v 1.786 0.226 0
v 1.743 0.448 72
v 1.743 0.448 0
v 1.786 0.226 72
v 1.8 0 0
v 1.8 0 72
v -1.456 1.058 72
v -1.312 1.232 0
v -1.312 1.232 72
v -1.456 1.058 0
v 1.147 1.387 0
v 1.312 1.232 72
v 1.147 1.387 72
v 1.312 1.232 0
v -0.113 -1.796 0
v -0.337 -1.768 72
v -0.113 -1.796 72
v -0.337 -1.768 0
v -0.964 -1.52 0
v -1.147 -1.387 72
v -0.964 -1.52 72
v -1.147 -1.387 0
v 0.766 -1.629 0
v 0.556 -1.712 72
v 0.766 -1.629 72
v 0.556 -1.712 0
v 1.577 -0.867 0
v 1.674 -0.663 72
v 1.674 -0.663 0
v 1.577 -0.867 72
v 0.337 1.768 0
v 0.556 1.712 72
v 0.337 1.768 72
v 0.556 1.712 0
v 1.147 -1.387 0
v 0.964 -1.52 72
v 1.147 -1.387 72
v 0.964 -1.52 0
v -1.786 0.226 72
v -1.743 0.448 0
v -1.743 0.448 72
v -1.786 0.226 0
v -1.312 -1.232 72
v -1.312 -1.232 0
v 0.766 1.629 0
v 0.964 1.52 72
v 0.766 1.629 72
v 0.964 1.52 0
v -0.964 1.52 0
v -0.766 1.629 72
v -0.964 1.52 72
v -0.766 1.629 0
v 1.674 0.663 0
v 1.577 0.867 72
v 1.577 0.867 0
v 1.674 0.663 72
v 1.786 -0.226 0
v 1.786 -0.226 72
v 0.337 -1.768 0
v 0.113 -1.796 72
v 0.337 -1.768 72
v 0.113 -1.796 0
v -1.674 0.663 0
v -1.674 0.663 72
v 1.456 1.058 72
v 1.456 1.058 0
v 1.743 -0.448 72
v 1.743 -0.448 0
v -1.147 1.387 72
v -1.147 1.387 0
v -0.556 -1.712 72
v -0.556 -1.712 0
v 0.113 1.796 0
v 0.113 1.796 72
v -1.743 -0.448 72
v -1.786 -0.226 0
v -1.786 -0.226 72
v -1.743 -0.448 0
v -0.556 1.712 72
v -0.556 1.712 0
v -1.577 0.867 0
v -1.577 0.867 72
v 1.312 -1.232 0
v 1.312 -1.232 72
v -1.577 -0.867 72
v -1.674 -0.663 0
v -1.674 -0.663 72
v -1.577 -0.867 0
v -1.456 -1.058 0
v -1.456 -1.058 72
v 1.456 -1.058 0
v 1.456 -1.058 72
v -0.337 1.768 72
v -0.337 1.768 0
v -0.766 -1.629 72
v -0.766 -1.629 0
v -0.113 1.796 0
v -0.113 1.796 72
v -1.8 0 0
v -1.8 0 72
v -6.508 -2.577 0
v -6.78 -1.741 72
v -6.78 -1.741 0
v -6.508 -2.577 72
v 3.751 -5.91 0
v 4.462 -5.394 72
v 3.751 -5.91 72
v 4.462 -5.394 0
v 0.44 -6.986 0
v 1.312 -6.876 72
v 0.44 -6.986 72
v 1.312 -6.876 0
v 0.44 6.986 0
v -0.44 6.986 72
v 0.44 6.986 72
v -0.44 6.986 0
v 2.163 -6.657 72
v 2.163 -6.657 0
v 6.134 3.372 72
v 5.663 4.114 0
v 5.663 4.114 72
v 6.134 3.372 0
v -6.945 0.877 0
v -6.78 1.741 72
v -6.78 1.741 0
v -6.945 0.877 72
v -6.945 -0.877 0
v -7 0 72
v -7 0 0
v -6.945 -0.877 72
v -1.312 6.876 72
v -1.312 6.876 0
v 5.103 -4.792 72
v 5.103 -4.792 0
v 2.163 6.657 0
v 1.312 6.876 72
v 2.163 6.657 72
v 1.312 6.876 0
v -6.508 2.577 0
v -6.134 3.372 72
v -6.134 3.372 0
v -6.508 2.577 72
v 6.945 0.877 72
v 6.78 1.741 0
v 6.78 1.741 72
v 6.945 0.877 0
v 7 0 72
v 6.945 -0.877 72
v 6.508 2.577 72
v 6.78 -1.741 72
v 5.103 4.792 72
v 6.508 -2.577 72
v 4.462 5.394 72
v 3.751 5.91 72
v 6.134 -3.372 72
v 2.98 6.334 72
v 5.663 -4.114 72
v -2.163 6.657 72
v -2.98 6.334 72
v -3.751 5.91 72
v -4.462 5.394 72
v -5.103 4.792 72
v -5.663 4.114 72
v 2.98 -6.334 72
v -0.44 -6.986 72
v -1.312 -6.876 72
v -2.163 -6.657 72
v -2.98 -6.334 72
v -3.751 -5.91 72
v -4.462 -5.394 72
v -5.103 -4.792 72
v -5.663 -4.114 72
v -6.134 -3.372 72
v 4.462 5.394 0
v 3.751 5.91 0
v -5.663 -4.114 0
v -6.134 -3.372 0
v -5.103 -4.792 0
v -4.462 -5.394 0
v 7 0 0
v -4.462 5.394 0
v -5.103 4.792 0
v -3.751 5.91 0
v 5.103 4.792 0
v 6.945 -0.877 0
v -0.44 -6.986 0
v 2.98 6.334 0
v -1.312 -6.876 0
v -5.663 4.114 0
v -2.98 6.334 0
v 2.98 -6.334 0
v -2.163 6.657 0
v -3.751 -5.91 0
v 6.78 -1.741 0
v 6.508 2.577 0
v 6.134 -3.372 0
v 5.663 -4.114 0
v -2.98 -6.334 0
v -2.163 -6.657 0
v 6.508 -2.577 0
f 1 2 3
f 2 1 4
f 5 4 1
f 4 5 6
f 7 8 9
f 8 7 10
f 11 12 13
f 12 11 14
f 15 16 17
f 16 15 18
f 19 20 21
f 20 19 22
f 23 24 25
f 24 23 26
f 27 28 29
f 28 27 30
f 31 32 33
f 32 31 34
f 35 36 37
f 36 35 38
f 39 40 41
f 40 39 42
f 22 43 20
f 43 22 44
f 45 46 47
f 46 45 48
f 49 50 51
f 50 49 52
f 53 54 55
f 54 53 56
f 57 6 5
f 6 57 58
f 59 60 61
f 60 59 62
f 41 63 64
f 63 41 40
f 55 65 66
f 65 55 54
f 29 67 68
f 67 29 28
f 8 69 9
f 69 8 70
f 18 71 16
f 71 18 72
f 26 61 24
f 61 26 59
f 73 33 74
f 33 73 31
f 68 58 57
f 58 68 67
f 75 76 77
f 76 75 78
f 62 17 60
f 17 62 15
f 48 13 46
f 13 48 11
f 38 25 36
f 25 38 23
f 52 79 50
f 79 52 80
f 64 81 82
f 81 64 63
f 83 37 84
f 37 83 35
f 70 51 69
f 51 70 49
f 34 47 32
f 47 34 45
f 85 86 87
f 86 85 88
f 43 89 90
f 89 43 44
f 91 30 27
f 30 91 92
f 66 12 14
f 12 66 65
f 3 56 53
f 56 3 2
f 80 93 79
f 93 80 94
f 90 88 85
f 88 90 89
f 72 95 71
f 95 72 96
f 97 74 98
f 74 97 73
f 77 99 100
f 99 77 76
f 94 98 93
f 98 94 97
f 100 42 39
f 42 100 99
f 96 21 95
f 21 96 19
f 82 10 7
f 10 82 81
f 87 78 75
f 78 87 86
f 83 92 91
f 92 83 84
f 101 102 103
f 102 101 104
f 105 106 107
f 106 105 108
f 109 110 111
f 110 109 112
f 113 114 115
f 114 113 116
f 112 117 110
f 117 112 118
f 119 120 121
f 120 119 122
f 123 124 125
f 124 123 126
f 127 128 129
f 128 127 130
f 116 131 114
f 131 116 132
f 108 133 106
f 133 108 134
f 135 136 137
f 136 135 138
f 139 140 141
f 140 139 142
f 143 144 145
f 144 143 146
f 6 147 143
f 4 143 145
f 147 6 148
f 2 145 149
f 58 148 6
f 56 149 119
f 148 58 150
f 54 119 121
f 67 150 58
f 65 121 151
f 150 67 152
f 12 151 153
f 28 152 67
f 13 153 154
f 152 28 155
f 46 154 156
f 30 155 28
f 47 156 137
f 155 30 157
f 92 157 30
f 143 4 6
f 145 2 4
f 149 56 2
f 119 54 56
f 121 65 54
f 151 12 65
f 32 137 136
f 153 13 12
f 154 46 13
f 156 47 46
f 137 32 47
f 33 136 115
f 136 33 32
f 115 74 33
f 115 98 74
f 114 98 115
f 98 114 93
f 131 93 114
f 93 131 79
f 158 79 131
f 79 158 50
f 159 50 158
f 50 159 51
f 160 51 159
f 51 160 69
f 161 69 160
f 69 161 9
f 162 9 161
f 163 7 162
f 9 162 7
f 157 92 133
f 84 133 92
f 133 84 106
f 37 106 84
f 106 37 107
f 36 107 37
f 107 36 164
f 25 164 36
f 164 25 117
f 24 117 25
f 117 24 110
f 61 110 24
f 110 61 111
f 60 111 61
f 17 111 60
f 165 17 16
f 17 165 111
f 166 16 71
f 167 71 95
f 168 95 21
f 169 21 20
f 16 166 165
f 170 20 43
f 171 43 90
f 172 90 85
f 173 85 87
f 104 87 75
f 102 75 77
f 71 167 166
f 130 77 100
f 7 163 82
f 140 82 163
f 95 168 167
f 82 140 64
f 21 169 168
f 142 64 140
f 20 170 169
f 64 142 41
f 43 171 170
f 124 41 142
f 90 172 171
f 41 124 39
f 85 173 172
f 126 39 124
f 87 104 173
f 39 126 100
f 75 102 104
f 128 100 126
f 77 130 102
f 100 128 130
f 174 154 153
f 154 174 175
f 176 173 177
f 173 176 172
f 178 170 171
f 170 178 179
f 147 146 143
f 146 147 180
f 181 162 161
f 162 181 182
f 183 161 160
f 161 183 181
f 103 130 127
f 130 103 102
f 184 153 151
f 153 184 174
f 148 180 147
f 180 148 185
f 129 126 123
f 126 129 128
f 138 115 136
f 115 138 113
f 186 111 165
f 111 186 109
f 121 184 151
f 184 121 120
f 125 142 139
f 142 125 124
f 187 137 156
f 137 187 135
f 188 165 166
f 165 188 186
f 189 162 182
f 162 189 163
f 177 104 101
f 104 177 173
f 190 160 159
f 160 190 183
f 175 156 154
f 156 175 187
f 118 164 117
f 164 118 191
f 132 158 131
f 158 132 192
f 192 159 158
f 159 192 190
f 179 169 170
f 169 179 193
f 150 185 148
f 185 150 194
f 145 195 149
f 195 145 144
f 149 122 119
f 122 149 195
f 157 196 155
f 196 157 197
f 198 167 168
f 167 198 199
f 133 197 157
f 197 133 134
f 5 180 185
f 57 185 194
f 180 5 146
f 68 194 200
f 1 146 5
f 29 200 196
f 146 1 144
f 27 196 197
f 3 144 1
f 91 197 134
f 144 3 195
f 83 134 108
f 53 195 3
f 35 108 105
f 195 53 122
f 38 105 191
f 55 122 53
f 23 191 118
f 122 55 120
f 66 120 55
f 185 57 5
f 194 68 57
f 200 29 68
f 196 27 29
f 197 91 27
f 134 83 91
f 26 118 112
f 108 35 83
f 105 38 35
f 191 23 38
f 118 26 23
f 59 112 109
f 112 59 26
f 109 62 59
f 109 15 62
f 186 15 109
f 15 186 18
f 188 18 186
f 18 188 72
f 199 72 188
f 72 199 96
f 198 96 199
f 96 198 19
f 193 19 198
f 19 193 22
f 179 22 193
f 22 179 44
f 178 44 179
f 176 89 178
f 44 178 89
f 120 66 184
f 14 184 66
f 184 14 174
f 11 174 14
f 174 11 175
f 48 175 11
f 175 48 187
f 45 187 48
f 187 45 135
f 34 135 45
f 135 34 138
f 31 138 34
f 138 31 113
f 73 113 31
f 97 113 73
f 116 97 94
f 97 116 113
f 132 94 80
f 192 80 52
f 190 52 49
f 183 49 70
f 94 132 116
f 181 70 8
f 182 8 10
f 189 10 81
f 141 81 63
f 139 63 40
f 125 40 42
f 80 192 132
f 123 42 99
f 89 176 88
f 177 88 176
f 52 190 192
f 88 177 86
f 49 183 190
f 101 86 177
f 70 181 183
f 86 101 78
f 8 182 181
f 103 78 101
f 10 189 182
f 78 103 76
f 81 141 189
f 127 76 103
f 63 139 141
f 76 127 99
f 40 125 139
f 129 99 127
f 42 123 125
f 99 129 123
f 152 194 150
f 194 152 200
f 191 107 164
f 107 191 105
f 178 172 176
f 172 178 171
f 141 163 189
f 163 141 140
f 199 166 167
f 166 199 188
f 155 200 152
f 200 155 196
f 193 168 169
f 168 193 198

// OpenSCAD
$fn = 50;


difference() {
	union() {
		cylinder(h = 72, r = 7.0000000000);
	}
	union() {
		translate(v = [0, 0, -100]) {
			cylinder(h = 200, r = 1.8000000000);
		}
		translate(v = [0, 0, -100]) {
			cylinder(h = 200, r = 1.8000000000);
		}
	}
}
